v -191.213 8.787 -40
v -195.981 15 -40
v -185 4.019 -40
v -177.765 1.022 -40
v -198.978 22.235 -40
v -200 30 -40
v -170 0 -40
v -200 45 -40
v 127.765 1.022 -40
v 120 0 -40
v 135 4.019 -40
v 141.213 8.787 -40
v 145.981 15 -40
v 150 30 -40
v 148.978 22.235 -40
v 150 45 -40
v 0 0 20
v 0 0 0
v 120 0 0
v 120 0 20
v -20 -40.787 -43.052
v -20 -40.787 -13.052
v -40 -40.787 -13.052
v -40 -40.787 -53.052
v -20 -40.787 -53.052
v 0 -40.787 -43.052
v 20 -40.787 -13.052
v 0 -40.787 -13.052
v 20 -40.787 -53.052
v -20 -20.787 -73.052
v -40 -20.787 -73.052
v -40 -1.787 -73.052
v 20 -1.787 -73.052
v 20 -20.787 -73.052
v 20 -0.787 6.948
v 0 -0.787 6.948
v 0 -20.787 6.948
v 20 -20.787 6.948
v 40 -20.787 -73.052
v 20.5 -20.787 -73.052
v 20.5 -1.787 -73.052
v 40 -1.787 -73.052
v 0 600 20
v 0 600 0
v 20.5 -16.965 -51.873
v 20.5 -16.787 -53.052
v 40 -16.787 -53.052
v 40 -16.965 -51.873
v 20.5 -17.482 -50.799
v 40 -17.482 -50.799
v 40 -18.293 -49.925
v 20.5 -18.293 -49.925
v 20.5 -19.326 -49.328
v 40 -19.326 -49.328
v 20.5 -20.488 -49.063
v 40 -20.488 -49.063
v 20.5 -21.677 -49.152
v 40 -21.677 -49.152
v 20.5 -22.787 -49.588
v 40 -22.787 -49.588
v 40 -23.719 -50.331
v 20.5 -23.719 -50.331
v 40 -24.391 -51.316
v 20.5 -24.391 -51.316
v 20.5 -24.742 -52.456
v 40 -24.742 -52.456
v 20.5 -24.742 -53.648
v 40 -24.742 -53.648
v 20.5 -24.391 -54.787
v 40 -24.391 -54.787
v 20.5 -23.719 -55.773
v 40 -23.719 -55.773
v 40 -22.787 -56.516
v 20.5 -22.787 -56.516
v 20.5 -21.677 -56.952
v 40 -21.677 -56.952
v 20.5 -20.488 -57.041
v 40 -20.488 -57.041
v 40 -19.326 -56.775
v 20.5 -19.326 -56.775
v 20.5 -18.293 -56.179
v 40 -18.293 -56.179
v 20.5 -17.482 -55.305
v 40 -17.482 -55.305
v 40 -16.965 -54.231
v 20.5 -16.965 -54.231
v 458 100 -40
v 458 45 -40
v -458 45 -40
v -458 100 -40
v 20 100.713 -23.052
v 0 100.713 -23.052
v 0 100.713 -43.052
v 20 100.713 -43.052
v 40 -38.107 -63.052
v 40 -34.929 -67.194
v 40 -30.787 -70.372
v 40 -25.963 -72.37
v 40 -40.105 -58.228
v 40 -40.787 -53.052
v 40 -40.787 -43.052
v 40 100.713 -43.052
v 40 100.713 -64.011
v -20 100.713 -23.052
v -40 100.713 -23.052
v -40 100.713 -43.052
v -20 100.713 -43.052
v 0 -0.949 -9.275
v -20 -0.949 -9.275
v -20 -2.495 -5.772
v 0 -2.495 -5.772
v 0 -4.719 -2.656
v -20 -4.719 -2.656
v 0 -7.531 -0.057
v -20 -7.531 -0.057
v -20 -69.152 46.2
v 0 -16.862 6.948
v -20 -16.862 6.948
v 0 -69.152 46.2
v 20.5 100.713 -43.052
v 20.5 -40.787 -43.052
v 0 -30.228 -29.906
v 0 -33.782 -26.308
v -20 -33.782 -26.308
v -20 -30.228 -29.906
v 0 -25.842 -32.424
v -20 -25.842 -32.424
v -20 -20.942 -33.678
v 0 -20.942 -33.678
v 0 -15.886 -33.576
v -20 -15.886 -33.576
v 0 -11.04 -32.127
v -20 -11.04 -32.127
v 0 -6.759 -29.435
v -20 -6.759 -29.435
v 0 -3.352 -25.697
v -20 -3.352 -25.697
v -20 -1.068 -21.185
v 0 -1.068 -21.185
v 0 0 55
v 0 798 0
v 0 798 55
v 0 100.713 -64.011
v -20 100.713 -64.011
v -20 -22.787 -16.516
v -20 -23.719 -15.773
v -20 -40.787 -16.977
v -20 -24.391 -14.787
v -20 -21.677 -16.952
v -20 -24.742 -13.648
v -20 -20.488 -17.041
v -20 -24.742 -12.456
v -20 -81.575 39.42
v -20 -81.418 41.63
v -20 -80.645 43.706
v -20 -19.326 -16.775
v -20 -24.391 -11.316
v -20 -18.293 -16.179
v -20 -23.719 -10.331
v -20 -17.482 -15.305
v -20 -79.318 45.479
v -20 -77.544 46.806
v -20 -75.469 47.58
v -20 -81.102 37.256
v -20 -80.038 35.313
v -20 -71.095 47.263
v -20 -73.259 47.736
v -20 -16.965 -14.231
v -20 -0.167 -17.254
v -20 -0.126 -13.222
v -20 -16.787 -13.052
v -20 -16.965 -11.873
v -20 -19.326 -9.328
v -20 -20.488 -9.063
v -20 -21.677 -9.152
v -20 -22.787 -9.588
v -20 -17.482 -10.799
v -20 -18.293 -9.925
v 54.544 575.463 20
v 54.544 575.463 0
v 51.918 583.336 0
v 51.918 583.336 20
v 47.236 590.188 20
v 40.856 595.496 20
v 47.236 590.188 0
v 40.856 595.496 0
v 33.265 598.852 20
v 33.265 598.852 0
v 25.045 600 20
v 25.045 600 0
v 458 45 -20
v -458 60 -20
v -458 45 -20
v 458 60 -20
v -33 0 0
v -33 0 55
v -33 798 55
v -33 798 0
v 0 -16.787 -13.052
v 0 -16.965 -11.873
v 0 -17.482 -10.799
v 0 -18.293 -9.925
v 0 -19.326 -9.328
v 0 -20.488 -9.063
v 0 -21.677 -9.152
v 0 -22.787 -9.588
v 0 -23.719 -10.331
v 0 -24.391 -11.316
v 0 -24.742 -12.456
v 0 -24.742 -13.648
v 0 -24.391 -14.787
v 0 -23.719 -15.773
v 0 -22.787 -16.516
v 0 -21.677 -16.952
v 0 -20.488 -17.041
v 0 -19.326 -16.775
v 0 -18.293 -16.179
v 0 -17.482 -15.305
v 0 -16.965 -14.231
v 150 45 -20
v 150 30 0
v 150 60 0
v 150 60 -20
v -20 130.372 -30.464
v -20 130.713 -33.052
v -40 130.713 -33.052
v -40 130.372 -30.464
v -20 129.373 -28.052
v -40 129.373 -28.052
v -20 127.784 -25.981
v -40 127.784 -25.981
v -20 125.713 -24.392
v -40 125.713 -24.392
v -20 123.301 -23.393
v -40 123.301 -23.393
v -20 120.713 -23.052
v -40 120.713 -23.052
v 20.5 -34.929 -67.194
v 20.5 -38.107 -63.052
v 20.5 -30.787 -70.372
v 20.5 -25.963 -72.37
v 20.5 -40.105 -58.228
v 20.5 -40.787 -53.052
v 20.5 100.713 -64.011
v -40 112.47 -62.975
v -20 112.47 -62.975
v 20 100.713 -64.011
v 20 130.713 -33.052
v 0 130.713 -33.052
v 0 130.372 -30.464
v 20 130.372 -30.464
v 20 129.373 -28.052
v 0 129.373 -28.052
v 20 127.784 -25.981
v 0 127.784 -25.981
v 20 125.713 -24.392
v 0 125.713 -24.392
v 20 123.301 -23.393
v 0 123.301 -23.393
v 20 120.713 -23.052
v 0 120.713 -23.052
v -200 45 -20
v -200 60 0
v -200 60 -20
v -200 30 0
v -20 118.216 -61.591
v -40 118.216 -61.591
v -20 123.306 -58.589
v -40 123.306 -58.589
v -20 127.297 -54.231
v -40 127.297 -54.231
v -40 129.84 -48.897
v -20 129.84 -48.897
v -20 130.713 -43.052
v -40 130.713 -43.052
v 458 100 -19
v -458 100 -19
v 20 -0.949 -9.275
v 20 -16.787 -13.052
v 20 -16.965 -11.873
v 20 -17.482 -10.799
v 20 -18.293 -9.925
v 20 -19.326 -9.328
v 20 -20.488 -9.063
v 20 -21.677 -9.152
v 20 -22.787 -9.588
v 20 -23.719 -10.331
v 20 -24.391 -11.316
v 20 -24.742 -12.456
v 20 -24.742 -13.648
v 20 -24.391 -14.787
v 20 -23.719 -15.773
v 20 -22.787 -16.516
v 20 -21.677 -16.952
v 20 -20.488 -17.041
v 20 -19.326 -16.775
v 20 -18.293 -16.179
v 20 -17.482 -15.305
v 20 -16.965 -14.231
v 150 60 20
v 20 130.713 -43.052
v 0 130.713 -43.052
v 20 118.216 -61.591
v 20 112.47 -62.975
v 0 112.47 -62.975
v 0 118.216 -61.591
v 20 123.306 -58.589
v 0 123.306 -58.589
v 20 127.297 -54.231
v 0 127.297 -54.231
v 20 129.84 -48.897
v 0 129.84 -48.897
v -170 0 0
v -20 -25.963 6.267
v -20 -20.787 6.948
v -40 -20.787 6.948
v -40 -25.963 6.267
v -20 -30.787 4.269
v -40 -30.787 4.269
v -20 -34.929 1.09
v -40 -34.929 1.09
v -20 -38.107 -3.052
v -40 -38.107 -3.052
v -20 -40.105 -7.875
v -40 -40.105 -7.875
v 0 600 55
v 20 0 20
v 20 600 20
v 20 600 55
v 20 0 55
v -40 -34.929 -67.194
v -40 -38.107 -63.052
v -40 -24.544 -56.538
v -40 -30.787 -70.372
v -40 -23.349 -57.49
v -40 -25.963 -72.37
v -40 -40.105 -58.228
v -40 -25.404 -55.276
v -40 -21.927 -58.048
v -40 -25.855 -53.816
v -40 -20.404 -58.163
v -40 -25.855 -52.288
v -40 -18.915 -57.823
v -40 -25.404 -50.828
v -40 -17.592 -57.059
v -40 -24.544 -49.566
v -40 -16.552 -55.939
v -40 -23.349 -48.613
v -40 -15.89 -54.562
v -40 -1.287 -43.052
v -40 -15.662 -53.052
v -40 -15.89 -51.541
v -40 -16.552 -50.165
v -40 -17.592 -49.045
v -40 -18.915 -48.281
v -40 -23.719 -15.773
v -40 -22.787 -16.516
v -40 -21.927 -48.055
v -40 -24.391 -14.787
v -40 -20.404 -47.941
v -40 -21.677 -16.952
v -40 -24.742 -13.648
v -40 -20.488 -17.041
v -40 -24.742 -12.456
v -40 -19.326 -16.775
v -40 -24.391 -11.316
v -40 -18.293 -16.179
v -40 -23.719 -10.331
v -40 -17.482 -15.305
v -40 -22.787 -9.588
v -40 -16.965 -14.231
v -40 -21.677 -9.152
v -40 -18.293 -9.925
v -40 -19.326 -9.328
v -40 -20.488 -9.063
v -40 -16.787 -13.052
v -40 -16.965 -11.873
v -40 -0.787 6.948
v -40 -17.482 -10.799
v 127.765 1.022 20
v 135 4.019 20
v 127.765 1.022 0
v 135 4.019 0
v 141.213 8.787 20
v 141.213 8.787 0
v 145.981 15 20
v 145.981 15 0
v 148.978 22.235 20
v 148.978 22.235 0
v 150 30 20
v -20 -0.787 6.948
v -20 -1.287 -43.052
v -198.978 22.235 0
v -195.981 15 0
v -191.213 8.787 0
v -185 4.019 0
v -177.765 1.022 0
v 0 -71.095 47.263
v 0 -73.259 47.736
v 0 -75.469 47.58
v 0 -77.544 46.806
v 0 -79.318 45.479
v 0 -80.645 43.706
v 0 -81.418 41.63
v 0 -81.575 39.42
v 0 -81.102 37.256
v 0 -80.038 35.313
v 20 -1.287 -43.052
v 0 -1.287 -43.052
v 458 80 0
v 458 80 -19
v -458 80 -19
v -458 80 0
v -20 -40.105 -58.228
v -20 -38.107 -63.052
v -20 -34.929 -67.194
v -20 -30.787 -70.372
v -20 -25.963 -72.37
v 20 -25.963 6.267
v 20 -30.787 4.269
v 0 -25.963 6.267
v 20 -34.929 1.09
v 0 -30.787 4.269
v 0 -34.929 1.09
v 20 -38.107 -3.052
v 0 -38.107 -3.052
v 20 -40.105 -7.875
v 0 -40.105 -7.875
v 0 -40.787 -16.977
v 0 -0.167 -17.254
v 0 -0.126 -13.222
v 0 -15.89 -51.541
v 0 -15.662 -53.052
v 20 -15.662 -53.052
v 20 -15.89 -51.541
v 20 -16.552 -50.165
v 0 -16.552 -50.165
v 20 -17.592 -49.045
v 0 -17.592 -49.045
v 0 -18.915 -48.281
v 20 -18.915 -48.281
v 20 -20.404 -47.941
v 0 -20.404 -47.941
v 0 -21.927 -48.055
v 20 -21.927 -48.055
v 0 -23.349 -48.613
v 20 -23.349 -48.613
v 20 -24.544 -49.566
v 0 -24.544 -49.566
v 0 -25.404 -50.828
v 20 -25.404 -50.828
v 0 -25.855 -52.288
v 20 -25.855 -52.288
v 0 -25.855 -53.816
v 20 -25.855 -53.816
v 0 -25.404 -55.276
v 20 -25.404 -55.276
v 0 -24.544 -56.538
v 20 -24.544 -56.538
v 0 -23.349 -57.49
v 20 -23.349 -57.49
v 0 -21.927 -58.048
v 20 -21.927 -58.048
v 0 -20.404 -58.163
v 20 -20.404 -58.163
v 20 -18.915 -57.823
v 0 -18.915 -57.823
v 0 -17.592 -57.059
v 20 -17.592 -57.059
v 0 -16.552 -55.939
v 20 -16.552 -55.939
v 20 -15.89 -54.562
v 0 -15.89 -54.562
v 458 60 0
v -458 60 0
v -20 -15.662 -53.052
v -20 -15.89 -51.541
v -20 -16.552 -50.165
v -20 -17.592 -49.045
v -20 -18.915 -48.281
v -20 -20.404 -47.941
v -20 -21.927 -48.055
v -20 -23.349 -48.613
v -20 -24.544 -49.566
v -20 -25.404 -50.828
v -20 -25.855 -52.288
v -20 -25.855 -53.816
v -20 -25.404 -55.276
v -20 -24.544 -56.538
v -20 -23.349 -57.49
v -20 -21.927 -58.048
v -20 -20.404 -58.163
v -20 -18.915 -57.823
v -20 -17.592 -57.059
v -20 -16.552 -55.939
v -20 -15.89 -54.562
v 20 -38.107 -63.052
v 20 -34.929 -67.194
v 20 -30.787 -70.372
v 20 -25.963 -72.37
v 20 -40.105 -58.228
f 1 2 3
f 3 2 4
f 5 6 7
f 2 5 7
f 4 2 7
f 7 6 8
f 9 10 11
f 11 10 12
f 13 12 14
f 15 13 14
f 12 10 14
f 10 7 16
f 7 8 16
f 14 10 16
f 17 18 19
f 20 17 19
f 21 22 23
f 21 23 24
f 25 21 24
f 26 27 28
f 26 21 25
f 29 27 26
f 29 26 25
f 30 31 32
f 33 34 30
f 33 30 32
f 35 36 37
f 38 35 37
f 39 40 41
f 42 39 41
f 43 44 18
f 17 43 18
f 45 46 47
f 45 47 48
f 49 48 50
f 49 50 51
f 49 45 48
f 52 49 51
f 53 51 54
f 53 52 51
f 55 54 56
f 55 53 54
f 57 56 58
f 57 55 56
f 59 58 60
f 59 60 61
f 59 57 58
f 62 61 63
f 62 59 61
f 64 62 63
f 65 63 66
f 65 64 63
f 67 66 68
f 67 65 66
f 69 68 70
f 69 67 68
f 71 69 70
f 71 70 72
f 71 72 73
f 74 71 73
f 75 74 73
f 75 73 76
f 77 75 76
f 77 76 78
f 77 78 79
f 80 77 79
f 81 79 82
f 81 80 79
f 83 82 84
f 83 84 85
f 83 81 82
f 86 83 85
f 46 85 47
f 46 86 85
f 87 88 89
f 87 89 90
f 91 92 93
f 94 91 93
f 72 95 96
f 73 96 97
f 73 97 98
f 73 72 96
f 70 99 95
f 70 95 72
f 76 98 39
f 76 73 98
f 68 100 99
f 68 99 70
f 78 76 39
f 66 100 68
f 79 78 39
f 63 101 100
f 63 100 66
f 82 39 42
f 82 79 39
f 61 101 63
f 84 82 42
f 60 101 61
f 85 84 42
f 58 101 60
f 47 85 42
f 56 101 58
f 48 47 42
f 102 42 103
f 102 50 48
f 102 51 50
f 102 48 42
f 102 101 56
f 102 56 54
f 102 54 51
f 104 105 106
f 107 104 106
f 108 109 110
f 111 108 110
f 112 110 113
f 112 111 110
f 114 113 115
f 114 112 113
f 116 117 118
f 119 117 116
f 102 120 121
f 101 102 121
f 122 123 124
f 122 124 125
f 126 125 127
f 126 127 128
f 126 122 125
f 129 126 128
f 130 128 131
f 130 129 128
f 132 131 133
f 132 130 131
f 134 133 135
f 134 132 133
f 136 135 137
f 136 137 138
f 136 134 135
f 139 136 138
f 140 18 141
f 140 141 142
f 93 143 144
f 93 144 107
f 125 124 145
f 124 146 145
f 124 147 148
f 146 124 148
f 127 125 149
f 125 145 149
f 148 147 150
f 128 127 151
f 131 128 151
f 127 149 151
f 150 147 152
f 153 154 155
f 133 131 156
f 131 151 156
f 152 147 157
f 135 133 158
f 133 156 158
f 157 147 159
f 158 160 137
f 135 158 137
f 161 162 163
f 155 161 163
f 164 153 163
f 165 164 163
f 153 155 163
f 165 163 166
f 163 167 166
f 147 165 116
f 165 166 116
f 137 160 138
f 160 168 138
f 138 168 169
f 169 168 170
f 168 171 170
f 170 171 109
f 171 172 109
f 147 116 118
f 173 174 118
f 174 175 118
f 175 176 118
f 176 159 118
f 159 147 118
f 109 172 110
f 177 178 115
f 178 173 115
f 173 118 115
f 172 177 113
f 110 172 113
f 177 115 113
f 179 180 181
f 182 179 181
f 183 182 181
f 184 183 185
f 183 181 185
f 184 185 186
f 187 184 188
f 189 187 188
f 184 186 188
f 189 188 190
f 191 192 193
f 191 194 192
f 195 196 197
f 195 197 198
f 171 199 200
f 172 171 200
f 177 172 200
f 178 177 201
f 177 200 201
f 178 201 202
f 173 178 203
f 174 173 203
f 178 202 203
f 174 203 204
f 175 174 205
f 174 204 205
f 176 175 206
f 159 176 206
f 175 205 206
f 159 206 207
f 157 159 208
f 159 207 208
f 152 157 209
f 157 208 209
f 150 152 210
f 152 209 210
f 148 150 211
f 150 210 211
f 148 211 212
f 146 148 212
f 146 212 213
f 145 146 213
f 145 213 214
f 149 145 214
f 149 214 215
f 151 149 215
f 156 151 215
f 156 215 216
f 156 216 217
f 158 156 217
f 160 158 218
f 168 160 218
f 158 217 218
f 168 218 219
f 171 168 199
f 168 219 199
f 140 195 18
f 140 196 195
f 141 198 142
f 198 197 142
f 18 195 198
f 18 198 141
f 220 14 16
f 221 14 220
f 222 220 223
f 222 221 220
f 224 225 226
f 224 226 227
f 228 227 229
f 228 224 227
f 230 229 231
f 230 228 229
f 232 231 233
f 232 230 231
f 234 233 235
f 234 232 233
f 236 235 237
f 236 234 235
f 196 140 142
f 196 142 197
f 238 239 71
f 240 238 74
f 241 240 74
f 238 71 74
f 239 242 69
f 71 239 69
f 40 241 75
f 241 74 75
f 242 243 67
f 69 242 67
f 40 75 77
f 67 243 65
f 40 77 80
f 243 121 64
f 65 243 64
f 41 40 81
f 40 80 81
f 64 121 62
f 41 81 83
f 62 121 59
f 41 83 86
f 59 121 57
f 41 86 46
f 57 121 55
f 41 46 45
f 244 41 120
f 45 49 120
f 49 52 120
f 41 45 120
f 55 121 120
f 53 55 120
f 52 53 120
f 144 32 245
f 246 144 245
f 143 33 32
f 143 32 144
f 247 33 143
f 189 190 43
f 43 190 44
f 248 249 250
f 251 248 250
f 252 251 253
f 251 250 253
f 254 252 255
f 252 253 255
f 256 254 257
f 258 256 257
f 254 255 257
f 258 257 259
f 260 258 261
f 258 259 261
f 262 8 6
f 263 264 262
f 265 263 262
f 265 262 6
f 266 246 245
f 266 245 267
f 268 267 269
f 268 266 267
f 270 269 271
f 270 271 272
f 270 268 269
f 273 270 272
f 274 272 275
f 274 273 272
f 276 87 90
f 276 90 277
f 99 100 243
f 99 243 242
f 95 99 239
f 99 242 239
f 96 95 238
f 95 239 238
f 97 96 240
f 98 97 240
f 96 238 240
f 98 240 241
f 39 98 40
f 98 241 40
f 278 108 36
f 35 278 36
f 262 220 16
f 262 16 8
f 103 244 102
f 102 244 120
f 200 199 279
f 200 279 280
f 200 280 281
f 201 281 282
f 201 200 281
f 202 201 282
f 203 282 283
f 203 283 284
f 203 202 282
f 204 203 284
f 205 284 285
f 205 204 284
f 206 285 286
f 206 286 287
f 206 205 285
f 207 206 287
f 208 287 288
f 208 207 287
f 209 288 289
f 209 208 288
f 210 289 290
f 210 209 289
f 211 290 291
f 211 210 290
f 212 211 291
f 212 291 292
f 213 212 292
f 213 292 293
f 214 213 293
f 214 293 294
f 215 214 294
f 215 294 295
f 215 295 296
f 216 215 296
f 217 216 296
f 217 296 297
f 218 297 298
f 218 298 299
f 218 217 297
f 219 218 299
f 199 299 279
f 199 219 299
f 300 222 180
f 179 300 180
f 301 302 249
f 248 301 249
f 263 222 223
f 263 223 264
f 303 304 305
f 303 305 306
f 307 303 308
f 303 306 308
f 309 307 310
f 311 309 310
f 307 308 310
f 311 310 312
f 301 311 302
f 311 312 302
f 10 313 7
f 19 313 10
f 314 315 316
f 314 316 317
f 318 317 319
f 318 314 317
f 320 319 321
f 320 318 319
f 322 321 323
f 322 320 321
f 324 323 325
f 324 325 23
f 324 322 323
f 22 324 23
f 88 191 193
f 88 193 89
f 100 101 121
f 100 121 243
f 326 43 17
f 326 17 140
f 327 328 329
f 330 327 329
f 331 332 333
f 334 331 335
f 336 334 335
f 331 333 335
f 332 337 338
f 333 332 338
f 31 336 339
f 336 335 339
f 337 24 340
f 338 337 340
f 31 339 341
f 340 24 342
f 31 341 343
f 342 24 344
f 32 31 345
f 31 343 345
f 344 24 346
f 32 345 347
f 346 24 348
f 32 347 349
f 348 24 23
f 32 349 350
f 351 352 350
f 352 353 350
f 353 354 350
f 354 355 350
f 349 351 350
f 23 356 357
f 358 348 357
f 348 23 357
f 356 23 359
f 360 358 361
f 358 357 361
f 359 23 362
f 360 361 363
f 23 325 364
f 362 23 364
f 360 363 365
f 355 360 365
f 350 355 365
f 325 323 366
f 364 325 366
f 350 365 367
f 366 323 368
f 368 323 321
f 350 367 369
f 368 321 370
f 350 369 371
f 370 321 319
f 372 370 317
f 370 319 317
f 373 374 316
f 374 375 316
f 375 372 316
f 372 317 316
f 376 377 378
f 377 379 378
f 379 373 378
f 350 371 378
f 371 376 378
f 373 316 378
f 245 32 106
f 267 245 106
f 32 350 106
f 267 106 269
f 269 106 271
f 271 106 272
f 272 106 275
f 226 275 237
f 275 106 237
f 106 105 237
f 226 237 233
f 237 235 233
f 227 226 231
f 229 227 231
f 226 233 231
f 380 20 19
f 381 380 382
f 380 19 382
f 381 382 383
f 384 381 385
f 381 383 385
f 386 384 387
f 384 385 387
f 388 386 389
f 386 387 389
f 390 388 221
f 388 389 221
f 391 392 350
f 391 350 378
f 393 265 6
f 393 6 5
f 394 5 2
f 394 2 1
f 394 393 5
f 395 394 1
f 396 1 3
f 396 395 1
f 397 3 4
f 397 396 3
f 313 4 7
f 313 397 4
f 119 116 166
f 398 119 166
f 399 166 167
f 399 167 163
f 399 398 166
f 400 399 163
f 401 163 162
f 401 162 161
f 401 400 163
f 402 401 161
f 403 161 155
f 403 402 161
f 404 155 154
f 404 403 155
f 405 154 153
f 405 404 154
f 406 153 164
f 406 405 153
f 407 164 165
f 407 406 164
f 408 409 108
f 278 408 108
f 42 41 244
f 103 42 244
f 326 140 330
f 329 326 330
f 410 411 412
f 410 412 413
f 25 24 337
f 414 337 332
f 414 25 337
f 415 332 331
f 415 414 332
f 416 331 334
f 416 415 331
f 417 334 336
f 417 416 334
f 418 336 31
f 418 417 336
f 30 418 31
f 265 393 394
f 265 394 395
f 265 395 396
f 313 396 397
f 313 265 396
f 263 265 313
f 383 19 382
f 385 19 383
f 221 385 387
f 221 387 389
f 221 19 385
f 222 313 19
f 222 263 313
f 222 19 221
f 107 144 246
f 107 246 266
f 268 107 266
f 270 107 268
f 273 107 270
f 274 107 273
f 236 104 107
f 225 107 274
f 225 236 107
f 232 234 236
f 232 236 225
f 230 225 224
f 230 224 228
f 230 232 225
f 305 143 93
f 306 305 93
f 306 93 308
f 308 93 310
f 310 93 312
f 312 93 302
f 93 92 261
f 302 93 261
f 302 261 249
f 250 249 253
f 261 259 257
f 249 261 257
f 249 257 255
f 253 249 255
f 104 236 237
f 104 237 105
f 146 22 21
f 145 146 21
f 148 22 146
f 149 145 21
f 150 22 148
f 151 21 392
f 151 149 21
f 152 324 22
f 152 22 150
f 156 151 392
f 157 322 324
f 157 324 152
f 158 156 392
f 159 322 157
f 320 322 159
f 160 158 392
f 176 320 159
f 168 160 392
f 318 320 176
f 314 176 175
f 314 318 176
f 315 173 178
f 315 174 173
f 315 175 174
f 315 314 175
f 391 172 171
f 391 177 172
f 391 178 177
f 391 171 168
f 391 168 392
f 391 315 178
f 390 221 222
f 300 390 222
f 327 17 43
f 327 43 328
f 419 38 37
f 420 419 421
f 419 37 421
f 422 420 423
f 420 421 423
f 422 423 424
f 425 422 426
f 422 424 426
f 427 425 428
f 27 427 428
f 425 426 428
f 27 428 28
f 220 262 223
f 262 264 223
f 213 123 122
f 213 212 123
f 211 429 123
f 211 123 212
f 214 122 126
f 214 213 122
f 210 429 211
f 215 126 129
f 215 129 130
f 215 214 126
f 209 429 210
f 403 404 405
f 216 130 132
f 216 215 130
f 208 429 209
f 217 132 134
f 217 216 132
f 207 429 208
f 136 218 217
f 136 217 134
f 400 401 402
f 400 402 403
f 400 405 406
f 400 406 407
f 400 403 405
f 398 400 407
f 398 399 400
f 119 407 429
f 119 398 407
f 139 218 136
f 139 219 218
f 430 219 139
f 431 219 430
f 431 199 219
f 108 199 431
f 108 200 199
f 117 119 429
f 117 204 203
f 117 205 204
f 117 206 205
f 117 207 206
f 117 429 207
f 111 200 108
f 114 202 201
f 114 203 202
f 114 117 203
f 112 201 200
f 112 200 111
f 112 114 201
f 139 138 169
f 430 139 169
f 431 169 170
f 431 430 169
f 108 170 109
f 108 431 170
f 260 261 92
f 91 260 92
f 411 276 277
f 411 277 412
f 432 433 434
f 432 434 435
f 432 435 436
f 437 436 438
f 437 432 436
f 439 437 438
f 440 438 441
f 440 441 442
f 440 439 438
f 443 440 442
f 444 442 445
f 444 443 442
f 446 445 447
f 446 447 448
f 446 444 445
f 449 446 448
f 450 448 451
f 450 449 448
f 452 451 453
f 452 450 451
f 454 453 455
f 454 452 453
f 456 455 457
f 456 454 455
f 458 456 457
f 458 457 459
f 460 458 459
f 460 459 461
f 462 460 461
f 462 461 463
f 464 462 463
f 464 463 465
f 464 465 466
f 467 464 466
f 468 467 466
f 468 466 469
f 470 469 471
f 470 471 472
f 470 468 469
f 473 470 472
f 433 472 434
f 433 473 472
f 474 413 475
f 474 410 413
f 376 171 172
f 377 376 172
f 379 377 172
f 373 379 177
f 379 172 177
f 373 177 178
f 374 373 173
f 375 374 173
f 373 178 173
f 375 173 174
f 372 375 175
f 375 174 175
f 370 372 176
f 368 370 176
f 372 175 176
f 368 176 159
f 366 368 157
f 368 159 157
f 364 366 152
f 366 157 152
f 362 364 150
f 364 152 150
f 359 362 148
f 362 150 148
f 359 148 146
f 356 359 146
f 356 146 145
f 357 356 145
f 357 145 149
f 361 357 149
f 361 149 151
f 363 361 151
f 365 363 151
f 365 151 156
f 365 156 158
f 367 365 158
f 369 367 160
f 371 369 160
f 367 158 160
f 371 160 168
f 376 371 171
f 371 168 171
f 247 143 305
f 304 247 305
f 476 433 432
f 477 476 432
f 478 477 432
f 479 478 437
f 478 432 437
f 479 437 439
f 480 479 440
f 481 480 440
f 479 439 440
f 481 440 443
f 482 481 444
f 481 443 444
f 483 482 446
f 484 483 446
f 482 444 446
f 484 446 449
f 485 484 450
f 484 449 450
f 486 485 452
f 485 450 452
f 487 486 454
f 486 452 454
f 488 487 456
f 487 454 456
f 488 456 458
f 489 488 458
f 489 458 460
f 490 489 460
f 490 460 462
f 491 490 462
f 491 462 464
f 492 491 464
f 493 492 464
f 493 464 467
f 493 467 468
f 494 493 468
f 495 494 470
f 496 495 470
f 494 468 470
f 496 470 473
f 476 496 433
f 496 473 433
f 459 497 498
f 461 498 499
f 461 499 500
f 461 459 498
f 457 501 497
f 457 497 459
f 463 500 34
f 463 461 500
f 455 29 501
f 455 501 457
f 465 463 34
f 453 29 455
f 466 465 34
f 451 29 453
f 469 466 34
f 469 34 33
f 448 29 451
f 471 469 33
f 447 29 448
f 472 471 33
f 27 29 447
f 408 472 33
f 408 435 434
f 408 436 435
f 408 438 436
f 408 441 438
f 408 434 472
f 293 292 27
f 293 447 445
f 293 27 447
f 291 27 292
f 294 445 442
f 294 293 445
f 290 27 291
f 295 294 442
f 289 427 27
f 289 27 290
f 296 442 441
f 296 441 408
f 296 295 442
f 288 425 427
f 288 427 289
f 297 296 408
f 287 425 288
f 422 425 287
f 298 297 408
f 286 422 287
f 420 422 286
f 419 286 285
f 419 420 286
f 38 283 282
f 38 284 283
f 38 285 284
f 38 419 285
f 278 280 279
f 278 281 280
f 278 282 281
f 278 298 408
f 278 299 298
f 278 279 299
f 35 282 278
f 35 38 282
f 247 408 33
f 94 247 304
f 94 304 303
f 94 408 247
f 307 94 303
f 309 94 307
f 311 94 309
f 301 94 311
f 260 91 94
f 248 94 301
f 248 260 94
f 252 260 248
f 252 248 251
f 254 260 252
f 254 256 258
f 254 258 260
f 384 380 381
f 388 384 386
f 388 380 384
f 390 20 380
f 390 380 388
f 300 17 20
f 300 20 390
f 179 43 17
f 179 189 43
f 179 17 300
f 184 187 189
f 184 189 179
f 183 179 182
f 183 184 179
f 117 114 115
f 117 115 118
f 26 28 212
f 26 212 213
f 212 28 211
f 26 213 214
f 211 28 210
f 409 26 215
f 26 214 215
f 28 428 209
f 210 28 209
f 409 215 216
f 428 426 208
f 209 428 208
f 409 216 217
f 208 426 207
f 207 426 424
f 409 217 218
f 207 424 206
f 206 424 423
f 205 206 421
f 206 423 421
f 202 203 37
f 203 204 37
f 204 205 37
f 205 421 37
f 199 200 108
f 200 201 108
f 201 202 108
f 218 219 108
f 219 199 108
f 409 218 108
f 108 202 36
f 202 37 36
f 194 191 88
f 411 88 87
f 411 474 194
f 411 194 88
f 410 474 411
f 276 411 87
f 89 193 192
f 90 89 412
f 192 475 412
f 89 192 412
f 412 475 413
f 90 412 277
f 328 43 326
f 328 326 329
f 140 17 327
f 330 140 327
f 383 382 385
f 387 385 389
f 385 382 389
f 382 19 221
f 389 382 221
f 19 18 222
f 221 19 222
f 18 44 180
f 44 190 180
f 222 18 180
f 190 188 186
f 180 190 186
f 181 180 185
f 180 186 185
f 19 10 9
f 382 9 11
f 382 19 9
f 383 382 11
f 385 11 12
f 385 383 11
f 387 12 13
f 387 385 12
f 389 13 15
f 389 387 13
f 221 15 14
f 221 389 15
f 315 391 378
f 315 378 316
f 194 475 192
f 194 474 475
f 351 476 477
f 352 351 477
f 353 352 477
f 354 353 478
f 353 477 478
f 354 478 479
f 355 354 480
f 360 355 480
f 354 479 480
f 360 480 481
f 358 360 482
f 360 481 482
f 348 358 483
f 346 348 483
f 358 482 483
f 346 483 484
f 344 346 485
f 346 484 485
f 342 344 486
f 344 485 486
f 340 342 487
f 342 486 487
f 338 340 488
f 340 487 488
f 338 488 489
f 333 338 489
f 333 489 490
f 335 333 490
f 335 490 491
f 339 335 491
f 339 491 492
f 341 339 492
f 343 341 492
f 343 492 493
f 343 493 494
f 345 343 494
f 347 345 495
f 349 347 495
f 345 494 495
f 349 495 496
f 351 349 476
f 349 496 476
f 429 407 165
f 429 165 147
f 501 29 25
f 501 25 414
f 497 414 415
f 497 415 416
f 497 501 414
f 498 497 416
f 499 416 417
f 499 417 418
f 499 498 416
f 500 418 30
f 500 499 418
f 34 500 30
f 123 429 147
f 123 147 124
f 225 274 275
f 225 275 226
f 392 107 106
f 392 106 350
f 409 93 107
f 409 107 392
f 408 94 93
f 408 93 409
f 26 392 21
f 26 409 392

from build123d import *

# Parameters (mm, degrees)
F1_DEPTH      = 798
F2_W          = 150
F2_H          = 15
F3_DEPTH      = 20
F0_W          = 20
F0_H          = 35
F4_DEPTH      = 600
F2_W_2        = 200
F5_DEPTH      = 20
F6_DEPTH      = 40
F8_DEPTH      = 458
F8_DEPTH_BACK = 458
F7_R          = 5.125
F7_R_2        = 4
F9_DEPTH      = 20
F10_DEPTH     = 20
F11_START     = -40
F9_FACE_R     = 5.125
F9_FACE_R_2   = 4
F11_DEPTH     = 20
F12_DEPTH     = 20
F13_START     = 20.5
F13_DEPTH     = 19.5


with BuildPart() as f1:
    # F0 (on Front) → F1 (new body)
    with BuildSketch(Plane.XZ):
        Polygon((-33, 0), (0, 0), (0, 20), (0, 55), (-33, 55), align=None)
    extrude(amount=-F1_DEPTH)


with BuildPart() as f3:
    # F2 (on Top) → F3 (new body)
    with BuildSketch(Plane.XY):
        with BuildLine():
            Line((0, 600), (0, 60))
            Line((0, 60), (150, 60))
            Line((150, 60), (54.5439485545, 575.4626778055))
            ThreePointArc((54.5439485545, 575.4626778055), (44.2303739381, 593.0638281099), (25.045488405, 600))
            Line((25.045488405, 600), (0, 600))
        make_face()
        with BuildLine():
            Line((0, 45), (0, 0))
            Line((0, 0), (120, 0))
            ThreePointArc((120, 0), (141.2132034356, 8.7867965644), (150, 30))
            Line((150, 30), (150, 45))
            Line((150, 45), (0, 45))
        make_face()
        with Locations((75, 52.5)):
            Rectangle(F2_W, F2_H)
    extrude(amount=F3_DEPTH)


with BuildPart() as f4:
    # F0 (on Front) → F4 (new body, through all)
    with BuildSketch(Plane.XZ):
        with Locations((10, 37.5)):
            Rectangle(F0_W, F0_H)
    extrude(amount=-F4_DEPTH)


with BuildPart() as f5:
    # F2 (on Top) → F5 (new body)
    with BuildSketch(Plane.XY):
        with BuildLine():
            Line((0, 45), (0, 0))
            Line((0, 0), (120, 0))
            ThreePointArc((120, 0), (141.2132034356, 8.7867965644), (150, 30))
            Line((150, 30), (150, 45))
            Line((150, 45), (0, 45))
        make_face()
        with BuildLine():
            Line((-170, 0), (0, 0))
            Line((0, 0), (0, 45))
            Line((0, 45), (-200, 45))
            Line((-200, 45), (-200, 30))
            ThreePointArc((-200, 30), (-191.2132034356, 8.7867965644), (-170, 0))
        make_face()
        with Locations((-100, 52.5)):
            Rectangle(F2_W_2, F2_H)
        with Locations((75, 52.5)):
            Rectangle(F2_W, F2_H)
    extrude(amount=-F5_DEPTH)

    # F2 (on Top) → F6 (join)
    with BuildSketch(Plane.XY):
        with BuildLine():
            Line((-170, 0), (0, 0))
            Line((0, 0), (0, 45))
            Line((0, 45), (-200, 45))
            Line((-200, 45), (-200, 30))
            ThreePointArc((-200, 30), (-191.2132034356, 8.7867965644), (-170, 0))
        make_face()
        with BuildLine():
            Line((0, 45), (0, 0))
            Line((0, 0), (120, 0))
            ThreePointArc((120, 0), (141.2132034356, 8.7867965644), (150, 30))
            Line((150, 30), (150, 45))
            Line((150, 45), (0, 45))
        make_face()
    extrude(amount=-F6_DEPTH)


with BuildPart() as f8:
    # F7 (on Right) → F8 (new body, two sides)
    with BuildSketch(Plane.YZ) as f8_sk:
        Polygon((60, -20), (45, -20), (45, -40), (100, -40), (100, -19), (80, -19), (80, 0), (60, 0), align=None)
    extrude(amount=F8_DEPTH)
    extrude(f8_sk.sketch, amount=-F8_DEPTH_BACK)


with BuildPart() as f9:
    # F7 (on Right) → F9 (new body)
    with BuildSketch(Plane.YZ):
        with BuildLine():
            Line((100.7131075272, -43.0518470941), (-1.2868924728, -43.0518470941))
            Line((-1.2868924728, -43.0518470941), (-40.7868924728, -43.0518470941))
            Line((-40.7868924728, -43.0518470941), (-40.7868924728, -53.0518470941))
            ThreePointArc((-40.7868924728, -53.0518470941), (-34.9290280966, -67.1939827178), (-20.7868924728, -73.0518470941))
            Line((-20.7868924728, -73.0518470941), (-1.7868924728, -73.0518470941))
            Line((-1.7868924728, -73.0518470941), (100.7131075272, -64.0114742078))
            Line((100.7131075272, -64.0114742078), (100.7131075272, -43.0518470941))
        make_face()
        with Locations((-20.7868924728, -53.0518470941)):
            Circle(F7_R, mode=Mode.SUBTRACT)
        with BuildLine():
            ThreePointArc((-33.7822252527, -26.3080673665), (-15.8857687606, -33.5760469744), (-1.0682204113, -21.1846409416))
            Line((-1.0682204113, -21.1846409416), (-0.9491201788, -9.2746176901))
            ThreePointArc((-0.9491201788, -9.2746176901), (-3.5271920064, -4.1567086519), (-7.5306722004, -0.0565143142))
            Line((-7.5306722004, -0.0565143142), (-16.862163006, 6.9481529059))
            Line((-16.862163006, 6.9481529059), (-20.7868924728, 6.9481529059))
            ThreePointArc((-20.7868924728, 6.9481529059), (-34.9290280966, 1.0902885296), (-40.7868924728, -13.0518470941))
            Line((-40.7868924728, -13.0518470941), (-40.7868924728, -16.9765765609))
            Line((-40.7868924728, -16.9765765609), (-33.7822252527, -26.3080673665))
        make_face()
        with Locations((-20.7868924728, -13.0518470941)):
            Circle(F7_R_2, mode=Mode.SUBTRACT)
        with BuildLine():
            ThreePointArc((-7.5306722004, -0.0565143142), (-3.5271920064, -4.1567086519), (-0.9491201788, -9.2746176901))
            Line((-0.9491201788, -9.2746176901), (-0.7868924728, 6.9481529059))
            Line((-0.7868924728, 6.9481529059), (-16.862163006, 6.9481529059))
            Line((-16.862163006, 6.9481529059), (-7.5306722004, -0.0565143142))
        make_face()
        with BuildLine():
            Line((100.7131075272, -23.0518470941), (100.7131075272, -43.0518470941))
            Line((100.7131075272, -43.0518470941), (100.7131075272, -64.0114742078))
            Line((100.7131075272, -64.0114742078), (112.4702614954, -62.9745078083))
            ThreePointArc((112.4702614954, -62.9745078083), (125.4634139539, -56.5584551182), (130.7131075272, -43.0518470941))
            Line((130.7131075272, -43.0518470941), (130.7131075272, -33.0518470941))
            ThreePointArc((130.7131075272, -33.0518470941), (127.784175339, -25.9807792822), (120.7131075272, -23.0518470941))
            Line((120.7131075272, -23.0518470941), (100.7131075272, -23.0518470941))
        make_face()
        with BuildLine():
            Line((-40.7868924728, -43.0518470941), (-1.2868924728, -43.0518470941))
            Line((-1.2868924728, -43.0518470941), (-1.0682204113, -21.1846409416))
            ThreePointArc((-1.0682204113, -21.1846409416), (-15.8857687606, -33.5760469744), (-33.7822252527, -26.3080673665))
            Line((-33.7822252527, -26.3080673665), (-40.7868924728, -16.9765765609))
            Line((-40.7868924728, -16.9765765609), (-40.7868924728, -43.0518470941))
        make_face()
    extrude(amount=F9_DEPTH)

    # F7 (on Right) → F10 (join)
    with BuildSketch(Plane.YZ):
        with BuildLine():
            Line((100.7131075272, -43.0518470941), (-1.2868924728, -43.0518470941))
            Line((-1.2868924728, -43.0518470941), (-40.7868924728, -43.0518470941))
            Line((-40.7868924728, -43.0518470941), (-40.7868924728, -53.0518470941))
            ThreePointArc((-40.7868924728, -53.0518470941), (-34.9290280966, -67.1939827178), (-20.7868924728, -73.0518470941))
            Line((-20.7868924728, -73.0518470941), (-1.7868924728, -73.0518470941))
            Line((-1.7868924728, -73.0518470941), (100.7131075272, -64.0114742078))
            Line((100.7131075272, -64.0114742078), (100.7131075272, -43.0518470941))
        make_face()
        with Locations((-20.7868924728, -53.0518470941)):
            Circle(F7_R, mode=Mode.SUBTRACT)
    extrude(amount=-F10_DEPTH)

    # F9_face (on face) → F11 (join)
    with BuildSketch(Plane(origin=(20, 28.8911192498, -43.4988944495), x_dir=(0, 1, 0), z_dir=(1, 0, 0)).offset(F11_START)):
        with BuildLine():
            Line((-30.6780117226, -29.5529526446), (83.5791422456, -19.4756133588))
            ThreePointArc((83.5791422456, -19.4756133588), (96.5722947041, -13.0595606688), (101.8219882774, 0.4470473554))
            Line((101.8219882774, 0.4470473554), (101.8219882774, 10.4470473554))
            ThreePointArc((101.8219882774, 10.4470473554), (98.8930560892, 17.5181151673), (91.8219882774, 20.4470473554))
            Line((91.8219882774, 20.4470473554), (71.8219882774, 20.4470473554))
            Line((71.8219882774, 20.4470473554), (71.8219882774, 0.4470473554))
            Line((71.8219882774, 0.4470473554), (-30.1780117226, 0.4470473554))
            Line((-30.1780117226, 0.4470473554), (-29.6780117226, 50.4470473554))
            Line((-29.6780117226, 50.4470473554), (-49.6780117226, 50.4470473554))
            ThreePointArc((-49.6780117226, 50.4470473554), (-63.8201473463, 44.5891829791), (-69.6780117226, 30.4470473554))
            Line((-69.6780117226, 30.4470473554), (-69.6780117226, -9.5529526446))
            ThreePointArc((-69.6780117226, -9.5529526446), (-63.8201473463, -23.6950882683), (-49.6780117226, -29.5529526446))
            Line((-49.6780117226, -29.5529526446), (-30.6780117226, -29.5529526446))
        make_face()
        with Locations((-49.6780117226, -9.5529526446)):
            Circle(F9_FACE_R, mode=Mode.SUBTRACT)
        with Locations((-49.6780117226, 30.4470473554)):
            Circle(F9_FACE_R_2, mode=Mode.SUBTRACT)
    extrude(amount=-F11_DEPTH)


with BuildPart() as f12:
    # F7 (on Right) → F12 (new body)
    with BuildSketch(Plane.YZ):
        with BuildLine():
            ThreePointArc((-33.7822252527, -26.3080673665), (-15.8857687606, -33.5760469744), (-1.0682204113, -21.1846409416))
            Line((-1.0682204113, -21.1846409416), (-0.9491201788, -9.2746176901))
            ThreePointArc((-0.9491201788, -9.2746176901), (-3.5271920064, -4.1567086519), (-7.5306722004, -0.0565143142))
            Line((-7.5306722004, -0.0565143142), (-16.862163006, 6.9481529059))
            Line((-16.862163006, 6.9481529059), (-20.7868924728, 6.9481529059))
            ThreePointArc((-20.7868924728, 6.9481529059), (-34.9290280966, 1.0902885296), (-40.7868924728, -13.0518470941))
            Line((-40.7868924728, -13.0518470941), (-40.7868924728, -16.9765765609))
            Line((-40.7868924728, -16.9765765609), (-33.7822252527, -26.3080673665))
        make_face()
        with Locations((-20.7868924728, -13.0518470941)):
            Circle(F7_R_2, mode=Mode.SUBTRACT)
        with BuildLine():
            Line((-80.0382489084, 35.3133695813), (-40.7868924728, -16.9765765609))
            Line((-40.7868924728, -16.9765765609), (-40.7868924728, -13.0518470941))
            ThreePointArc((-40.7868924728, -13.0518470941), (-34.9290280966, 1.0902885296), (-20.7868924728, 6.9481529059))
            Line((-20.7868924728, 6.9481529059), (-16.862163006, 6.9481529059))
            Line((-16.862163006, 6.9481529059), (-69.1521091483, 46.1995093414))
            ThreePointArc((-69.1521091483, 46.1995093414), (-79.3179066679, 45.479167101), (-80.0382489084, 35.3133695813))
        make_face()
        with BuildLine():
            Line((-0.9491201788, -9.2746176901), (-1.0682204113, -21.1846409416))
            ThreePointArc((-1.0682204113, -21.1846409416), (-0.0378299025, -15.2393377198), (-0.9491201788, -9.2746176901))
        make_face()
    extrude(amount=-F12_DEPTH)


with BuildPart() as f13:
    # F7 (on Right) → F13 (new body)
    with BuildSketch(Plane.YZ.offset(F13_START)):
        with BuildLine():
            Line((100.7131075272, -43.0518470941), (-1.2868924728, -43.0518470941))
            Line((-1.2868924728, -43.0518470941), (-40.7868924728, -43.0518470941))
            Line((-40.7868924728, -43.0518470941), (-40.7868924728, -53.0518470941))
            ThreePointArc((-40.7868924728, -53.0518470941), (-34.9290280966, -67.1939827178), (-20.7868924728, -73.0518470941))
            Line((-20.7868924728, -73.0518470941), (-1.7868924728, -73.0518470941))
            Line((-1.7868924728, -73.0518470941), (100.7131075272, -64.0114742078))
            Line((100.7131075272, -64.0114742078), (100.7131075272, -43.0518470941))
        make_face()
        with Locations((-20.7868924728, -53.0518470941)):
            Circle(F7_R, mode=Mode.SUBTRACT)
        with Locations((-20.7868924728, -53.0518470941)):
            Circle(F7_R)
        with Locations((-20.7868924728, -53.0518470941)):
            Circle(F7_R_2, mode=Mode.SUBTRACT)
    extrude(amount=F13_DEPTH)


solid = Compound([f1.part, f3.part, f4.part, f5.part, f8.part, f9.part, f12.part, f13.part])
